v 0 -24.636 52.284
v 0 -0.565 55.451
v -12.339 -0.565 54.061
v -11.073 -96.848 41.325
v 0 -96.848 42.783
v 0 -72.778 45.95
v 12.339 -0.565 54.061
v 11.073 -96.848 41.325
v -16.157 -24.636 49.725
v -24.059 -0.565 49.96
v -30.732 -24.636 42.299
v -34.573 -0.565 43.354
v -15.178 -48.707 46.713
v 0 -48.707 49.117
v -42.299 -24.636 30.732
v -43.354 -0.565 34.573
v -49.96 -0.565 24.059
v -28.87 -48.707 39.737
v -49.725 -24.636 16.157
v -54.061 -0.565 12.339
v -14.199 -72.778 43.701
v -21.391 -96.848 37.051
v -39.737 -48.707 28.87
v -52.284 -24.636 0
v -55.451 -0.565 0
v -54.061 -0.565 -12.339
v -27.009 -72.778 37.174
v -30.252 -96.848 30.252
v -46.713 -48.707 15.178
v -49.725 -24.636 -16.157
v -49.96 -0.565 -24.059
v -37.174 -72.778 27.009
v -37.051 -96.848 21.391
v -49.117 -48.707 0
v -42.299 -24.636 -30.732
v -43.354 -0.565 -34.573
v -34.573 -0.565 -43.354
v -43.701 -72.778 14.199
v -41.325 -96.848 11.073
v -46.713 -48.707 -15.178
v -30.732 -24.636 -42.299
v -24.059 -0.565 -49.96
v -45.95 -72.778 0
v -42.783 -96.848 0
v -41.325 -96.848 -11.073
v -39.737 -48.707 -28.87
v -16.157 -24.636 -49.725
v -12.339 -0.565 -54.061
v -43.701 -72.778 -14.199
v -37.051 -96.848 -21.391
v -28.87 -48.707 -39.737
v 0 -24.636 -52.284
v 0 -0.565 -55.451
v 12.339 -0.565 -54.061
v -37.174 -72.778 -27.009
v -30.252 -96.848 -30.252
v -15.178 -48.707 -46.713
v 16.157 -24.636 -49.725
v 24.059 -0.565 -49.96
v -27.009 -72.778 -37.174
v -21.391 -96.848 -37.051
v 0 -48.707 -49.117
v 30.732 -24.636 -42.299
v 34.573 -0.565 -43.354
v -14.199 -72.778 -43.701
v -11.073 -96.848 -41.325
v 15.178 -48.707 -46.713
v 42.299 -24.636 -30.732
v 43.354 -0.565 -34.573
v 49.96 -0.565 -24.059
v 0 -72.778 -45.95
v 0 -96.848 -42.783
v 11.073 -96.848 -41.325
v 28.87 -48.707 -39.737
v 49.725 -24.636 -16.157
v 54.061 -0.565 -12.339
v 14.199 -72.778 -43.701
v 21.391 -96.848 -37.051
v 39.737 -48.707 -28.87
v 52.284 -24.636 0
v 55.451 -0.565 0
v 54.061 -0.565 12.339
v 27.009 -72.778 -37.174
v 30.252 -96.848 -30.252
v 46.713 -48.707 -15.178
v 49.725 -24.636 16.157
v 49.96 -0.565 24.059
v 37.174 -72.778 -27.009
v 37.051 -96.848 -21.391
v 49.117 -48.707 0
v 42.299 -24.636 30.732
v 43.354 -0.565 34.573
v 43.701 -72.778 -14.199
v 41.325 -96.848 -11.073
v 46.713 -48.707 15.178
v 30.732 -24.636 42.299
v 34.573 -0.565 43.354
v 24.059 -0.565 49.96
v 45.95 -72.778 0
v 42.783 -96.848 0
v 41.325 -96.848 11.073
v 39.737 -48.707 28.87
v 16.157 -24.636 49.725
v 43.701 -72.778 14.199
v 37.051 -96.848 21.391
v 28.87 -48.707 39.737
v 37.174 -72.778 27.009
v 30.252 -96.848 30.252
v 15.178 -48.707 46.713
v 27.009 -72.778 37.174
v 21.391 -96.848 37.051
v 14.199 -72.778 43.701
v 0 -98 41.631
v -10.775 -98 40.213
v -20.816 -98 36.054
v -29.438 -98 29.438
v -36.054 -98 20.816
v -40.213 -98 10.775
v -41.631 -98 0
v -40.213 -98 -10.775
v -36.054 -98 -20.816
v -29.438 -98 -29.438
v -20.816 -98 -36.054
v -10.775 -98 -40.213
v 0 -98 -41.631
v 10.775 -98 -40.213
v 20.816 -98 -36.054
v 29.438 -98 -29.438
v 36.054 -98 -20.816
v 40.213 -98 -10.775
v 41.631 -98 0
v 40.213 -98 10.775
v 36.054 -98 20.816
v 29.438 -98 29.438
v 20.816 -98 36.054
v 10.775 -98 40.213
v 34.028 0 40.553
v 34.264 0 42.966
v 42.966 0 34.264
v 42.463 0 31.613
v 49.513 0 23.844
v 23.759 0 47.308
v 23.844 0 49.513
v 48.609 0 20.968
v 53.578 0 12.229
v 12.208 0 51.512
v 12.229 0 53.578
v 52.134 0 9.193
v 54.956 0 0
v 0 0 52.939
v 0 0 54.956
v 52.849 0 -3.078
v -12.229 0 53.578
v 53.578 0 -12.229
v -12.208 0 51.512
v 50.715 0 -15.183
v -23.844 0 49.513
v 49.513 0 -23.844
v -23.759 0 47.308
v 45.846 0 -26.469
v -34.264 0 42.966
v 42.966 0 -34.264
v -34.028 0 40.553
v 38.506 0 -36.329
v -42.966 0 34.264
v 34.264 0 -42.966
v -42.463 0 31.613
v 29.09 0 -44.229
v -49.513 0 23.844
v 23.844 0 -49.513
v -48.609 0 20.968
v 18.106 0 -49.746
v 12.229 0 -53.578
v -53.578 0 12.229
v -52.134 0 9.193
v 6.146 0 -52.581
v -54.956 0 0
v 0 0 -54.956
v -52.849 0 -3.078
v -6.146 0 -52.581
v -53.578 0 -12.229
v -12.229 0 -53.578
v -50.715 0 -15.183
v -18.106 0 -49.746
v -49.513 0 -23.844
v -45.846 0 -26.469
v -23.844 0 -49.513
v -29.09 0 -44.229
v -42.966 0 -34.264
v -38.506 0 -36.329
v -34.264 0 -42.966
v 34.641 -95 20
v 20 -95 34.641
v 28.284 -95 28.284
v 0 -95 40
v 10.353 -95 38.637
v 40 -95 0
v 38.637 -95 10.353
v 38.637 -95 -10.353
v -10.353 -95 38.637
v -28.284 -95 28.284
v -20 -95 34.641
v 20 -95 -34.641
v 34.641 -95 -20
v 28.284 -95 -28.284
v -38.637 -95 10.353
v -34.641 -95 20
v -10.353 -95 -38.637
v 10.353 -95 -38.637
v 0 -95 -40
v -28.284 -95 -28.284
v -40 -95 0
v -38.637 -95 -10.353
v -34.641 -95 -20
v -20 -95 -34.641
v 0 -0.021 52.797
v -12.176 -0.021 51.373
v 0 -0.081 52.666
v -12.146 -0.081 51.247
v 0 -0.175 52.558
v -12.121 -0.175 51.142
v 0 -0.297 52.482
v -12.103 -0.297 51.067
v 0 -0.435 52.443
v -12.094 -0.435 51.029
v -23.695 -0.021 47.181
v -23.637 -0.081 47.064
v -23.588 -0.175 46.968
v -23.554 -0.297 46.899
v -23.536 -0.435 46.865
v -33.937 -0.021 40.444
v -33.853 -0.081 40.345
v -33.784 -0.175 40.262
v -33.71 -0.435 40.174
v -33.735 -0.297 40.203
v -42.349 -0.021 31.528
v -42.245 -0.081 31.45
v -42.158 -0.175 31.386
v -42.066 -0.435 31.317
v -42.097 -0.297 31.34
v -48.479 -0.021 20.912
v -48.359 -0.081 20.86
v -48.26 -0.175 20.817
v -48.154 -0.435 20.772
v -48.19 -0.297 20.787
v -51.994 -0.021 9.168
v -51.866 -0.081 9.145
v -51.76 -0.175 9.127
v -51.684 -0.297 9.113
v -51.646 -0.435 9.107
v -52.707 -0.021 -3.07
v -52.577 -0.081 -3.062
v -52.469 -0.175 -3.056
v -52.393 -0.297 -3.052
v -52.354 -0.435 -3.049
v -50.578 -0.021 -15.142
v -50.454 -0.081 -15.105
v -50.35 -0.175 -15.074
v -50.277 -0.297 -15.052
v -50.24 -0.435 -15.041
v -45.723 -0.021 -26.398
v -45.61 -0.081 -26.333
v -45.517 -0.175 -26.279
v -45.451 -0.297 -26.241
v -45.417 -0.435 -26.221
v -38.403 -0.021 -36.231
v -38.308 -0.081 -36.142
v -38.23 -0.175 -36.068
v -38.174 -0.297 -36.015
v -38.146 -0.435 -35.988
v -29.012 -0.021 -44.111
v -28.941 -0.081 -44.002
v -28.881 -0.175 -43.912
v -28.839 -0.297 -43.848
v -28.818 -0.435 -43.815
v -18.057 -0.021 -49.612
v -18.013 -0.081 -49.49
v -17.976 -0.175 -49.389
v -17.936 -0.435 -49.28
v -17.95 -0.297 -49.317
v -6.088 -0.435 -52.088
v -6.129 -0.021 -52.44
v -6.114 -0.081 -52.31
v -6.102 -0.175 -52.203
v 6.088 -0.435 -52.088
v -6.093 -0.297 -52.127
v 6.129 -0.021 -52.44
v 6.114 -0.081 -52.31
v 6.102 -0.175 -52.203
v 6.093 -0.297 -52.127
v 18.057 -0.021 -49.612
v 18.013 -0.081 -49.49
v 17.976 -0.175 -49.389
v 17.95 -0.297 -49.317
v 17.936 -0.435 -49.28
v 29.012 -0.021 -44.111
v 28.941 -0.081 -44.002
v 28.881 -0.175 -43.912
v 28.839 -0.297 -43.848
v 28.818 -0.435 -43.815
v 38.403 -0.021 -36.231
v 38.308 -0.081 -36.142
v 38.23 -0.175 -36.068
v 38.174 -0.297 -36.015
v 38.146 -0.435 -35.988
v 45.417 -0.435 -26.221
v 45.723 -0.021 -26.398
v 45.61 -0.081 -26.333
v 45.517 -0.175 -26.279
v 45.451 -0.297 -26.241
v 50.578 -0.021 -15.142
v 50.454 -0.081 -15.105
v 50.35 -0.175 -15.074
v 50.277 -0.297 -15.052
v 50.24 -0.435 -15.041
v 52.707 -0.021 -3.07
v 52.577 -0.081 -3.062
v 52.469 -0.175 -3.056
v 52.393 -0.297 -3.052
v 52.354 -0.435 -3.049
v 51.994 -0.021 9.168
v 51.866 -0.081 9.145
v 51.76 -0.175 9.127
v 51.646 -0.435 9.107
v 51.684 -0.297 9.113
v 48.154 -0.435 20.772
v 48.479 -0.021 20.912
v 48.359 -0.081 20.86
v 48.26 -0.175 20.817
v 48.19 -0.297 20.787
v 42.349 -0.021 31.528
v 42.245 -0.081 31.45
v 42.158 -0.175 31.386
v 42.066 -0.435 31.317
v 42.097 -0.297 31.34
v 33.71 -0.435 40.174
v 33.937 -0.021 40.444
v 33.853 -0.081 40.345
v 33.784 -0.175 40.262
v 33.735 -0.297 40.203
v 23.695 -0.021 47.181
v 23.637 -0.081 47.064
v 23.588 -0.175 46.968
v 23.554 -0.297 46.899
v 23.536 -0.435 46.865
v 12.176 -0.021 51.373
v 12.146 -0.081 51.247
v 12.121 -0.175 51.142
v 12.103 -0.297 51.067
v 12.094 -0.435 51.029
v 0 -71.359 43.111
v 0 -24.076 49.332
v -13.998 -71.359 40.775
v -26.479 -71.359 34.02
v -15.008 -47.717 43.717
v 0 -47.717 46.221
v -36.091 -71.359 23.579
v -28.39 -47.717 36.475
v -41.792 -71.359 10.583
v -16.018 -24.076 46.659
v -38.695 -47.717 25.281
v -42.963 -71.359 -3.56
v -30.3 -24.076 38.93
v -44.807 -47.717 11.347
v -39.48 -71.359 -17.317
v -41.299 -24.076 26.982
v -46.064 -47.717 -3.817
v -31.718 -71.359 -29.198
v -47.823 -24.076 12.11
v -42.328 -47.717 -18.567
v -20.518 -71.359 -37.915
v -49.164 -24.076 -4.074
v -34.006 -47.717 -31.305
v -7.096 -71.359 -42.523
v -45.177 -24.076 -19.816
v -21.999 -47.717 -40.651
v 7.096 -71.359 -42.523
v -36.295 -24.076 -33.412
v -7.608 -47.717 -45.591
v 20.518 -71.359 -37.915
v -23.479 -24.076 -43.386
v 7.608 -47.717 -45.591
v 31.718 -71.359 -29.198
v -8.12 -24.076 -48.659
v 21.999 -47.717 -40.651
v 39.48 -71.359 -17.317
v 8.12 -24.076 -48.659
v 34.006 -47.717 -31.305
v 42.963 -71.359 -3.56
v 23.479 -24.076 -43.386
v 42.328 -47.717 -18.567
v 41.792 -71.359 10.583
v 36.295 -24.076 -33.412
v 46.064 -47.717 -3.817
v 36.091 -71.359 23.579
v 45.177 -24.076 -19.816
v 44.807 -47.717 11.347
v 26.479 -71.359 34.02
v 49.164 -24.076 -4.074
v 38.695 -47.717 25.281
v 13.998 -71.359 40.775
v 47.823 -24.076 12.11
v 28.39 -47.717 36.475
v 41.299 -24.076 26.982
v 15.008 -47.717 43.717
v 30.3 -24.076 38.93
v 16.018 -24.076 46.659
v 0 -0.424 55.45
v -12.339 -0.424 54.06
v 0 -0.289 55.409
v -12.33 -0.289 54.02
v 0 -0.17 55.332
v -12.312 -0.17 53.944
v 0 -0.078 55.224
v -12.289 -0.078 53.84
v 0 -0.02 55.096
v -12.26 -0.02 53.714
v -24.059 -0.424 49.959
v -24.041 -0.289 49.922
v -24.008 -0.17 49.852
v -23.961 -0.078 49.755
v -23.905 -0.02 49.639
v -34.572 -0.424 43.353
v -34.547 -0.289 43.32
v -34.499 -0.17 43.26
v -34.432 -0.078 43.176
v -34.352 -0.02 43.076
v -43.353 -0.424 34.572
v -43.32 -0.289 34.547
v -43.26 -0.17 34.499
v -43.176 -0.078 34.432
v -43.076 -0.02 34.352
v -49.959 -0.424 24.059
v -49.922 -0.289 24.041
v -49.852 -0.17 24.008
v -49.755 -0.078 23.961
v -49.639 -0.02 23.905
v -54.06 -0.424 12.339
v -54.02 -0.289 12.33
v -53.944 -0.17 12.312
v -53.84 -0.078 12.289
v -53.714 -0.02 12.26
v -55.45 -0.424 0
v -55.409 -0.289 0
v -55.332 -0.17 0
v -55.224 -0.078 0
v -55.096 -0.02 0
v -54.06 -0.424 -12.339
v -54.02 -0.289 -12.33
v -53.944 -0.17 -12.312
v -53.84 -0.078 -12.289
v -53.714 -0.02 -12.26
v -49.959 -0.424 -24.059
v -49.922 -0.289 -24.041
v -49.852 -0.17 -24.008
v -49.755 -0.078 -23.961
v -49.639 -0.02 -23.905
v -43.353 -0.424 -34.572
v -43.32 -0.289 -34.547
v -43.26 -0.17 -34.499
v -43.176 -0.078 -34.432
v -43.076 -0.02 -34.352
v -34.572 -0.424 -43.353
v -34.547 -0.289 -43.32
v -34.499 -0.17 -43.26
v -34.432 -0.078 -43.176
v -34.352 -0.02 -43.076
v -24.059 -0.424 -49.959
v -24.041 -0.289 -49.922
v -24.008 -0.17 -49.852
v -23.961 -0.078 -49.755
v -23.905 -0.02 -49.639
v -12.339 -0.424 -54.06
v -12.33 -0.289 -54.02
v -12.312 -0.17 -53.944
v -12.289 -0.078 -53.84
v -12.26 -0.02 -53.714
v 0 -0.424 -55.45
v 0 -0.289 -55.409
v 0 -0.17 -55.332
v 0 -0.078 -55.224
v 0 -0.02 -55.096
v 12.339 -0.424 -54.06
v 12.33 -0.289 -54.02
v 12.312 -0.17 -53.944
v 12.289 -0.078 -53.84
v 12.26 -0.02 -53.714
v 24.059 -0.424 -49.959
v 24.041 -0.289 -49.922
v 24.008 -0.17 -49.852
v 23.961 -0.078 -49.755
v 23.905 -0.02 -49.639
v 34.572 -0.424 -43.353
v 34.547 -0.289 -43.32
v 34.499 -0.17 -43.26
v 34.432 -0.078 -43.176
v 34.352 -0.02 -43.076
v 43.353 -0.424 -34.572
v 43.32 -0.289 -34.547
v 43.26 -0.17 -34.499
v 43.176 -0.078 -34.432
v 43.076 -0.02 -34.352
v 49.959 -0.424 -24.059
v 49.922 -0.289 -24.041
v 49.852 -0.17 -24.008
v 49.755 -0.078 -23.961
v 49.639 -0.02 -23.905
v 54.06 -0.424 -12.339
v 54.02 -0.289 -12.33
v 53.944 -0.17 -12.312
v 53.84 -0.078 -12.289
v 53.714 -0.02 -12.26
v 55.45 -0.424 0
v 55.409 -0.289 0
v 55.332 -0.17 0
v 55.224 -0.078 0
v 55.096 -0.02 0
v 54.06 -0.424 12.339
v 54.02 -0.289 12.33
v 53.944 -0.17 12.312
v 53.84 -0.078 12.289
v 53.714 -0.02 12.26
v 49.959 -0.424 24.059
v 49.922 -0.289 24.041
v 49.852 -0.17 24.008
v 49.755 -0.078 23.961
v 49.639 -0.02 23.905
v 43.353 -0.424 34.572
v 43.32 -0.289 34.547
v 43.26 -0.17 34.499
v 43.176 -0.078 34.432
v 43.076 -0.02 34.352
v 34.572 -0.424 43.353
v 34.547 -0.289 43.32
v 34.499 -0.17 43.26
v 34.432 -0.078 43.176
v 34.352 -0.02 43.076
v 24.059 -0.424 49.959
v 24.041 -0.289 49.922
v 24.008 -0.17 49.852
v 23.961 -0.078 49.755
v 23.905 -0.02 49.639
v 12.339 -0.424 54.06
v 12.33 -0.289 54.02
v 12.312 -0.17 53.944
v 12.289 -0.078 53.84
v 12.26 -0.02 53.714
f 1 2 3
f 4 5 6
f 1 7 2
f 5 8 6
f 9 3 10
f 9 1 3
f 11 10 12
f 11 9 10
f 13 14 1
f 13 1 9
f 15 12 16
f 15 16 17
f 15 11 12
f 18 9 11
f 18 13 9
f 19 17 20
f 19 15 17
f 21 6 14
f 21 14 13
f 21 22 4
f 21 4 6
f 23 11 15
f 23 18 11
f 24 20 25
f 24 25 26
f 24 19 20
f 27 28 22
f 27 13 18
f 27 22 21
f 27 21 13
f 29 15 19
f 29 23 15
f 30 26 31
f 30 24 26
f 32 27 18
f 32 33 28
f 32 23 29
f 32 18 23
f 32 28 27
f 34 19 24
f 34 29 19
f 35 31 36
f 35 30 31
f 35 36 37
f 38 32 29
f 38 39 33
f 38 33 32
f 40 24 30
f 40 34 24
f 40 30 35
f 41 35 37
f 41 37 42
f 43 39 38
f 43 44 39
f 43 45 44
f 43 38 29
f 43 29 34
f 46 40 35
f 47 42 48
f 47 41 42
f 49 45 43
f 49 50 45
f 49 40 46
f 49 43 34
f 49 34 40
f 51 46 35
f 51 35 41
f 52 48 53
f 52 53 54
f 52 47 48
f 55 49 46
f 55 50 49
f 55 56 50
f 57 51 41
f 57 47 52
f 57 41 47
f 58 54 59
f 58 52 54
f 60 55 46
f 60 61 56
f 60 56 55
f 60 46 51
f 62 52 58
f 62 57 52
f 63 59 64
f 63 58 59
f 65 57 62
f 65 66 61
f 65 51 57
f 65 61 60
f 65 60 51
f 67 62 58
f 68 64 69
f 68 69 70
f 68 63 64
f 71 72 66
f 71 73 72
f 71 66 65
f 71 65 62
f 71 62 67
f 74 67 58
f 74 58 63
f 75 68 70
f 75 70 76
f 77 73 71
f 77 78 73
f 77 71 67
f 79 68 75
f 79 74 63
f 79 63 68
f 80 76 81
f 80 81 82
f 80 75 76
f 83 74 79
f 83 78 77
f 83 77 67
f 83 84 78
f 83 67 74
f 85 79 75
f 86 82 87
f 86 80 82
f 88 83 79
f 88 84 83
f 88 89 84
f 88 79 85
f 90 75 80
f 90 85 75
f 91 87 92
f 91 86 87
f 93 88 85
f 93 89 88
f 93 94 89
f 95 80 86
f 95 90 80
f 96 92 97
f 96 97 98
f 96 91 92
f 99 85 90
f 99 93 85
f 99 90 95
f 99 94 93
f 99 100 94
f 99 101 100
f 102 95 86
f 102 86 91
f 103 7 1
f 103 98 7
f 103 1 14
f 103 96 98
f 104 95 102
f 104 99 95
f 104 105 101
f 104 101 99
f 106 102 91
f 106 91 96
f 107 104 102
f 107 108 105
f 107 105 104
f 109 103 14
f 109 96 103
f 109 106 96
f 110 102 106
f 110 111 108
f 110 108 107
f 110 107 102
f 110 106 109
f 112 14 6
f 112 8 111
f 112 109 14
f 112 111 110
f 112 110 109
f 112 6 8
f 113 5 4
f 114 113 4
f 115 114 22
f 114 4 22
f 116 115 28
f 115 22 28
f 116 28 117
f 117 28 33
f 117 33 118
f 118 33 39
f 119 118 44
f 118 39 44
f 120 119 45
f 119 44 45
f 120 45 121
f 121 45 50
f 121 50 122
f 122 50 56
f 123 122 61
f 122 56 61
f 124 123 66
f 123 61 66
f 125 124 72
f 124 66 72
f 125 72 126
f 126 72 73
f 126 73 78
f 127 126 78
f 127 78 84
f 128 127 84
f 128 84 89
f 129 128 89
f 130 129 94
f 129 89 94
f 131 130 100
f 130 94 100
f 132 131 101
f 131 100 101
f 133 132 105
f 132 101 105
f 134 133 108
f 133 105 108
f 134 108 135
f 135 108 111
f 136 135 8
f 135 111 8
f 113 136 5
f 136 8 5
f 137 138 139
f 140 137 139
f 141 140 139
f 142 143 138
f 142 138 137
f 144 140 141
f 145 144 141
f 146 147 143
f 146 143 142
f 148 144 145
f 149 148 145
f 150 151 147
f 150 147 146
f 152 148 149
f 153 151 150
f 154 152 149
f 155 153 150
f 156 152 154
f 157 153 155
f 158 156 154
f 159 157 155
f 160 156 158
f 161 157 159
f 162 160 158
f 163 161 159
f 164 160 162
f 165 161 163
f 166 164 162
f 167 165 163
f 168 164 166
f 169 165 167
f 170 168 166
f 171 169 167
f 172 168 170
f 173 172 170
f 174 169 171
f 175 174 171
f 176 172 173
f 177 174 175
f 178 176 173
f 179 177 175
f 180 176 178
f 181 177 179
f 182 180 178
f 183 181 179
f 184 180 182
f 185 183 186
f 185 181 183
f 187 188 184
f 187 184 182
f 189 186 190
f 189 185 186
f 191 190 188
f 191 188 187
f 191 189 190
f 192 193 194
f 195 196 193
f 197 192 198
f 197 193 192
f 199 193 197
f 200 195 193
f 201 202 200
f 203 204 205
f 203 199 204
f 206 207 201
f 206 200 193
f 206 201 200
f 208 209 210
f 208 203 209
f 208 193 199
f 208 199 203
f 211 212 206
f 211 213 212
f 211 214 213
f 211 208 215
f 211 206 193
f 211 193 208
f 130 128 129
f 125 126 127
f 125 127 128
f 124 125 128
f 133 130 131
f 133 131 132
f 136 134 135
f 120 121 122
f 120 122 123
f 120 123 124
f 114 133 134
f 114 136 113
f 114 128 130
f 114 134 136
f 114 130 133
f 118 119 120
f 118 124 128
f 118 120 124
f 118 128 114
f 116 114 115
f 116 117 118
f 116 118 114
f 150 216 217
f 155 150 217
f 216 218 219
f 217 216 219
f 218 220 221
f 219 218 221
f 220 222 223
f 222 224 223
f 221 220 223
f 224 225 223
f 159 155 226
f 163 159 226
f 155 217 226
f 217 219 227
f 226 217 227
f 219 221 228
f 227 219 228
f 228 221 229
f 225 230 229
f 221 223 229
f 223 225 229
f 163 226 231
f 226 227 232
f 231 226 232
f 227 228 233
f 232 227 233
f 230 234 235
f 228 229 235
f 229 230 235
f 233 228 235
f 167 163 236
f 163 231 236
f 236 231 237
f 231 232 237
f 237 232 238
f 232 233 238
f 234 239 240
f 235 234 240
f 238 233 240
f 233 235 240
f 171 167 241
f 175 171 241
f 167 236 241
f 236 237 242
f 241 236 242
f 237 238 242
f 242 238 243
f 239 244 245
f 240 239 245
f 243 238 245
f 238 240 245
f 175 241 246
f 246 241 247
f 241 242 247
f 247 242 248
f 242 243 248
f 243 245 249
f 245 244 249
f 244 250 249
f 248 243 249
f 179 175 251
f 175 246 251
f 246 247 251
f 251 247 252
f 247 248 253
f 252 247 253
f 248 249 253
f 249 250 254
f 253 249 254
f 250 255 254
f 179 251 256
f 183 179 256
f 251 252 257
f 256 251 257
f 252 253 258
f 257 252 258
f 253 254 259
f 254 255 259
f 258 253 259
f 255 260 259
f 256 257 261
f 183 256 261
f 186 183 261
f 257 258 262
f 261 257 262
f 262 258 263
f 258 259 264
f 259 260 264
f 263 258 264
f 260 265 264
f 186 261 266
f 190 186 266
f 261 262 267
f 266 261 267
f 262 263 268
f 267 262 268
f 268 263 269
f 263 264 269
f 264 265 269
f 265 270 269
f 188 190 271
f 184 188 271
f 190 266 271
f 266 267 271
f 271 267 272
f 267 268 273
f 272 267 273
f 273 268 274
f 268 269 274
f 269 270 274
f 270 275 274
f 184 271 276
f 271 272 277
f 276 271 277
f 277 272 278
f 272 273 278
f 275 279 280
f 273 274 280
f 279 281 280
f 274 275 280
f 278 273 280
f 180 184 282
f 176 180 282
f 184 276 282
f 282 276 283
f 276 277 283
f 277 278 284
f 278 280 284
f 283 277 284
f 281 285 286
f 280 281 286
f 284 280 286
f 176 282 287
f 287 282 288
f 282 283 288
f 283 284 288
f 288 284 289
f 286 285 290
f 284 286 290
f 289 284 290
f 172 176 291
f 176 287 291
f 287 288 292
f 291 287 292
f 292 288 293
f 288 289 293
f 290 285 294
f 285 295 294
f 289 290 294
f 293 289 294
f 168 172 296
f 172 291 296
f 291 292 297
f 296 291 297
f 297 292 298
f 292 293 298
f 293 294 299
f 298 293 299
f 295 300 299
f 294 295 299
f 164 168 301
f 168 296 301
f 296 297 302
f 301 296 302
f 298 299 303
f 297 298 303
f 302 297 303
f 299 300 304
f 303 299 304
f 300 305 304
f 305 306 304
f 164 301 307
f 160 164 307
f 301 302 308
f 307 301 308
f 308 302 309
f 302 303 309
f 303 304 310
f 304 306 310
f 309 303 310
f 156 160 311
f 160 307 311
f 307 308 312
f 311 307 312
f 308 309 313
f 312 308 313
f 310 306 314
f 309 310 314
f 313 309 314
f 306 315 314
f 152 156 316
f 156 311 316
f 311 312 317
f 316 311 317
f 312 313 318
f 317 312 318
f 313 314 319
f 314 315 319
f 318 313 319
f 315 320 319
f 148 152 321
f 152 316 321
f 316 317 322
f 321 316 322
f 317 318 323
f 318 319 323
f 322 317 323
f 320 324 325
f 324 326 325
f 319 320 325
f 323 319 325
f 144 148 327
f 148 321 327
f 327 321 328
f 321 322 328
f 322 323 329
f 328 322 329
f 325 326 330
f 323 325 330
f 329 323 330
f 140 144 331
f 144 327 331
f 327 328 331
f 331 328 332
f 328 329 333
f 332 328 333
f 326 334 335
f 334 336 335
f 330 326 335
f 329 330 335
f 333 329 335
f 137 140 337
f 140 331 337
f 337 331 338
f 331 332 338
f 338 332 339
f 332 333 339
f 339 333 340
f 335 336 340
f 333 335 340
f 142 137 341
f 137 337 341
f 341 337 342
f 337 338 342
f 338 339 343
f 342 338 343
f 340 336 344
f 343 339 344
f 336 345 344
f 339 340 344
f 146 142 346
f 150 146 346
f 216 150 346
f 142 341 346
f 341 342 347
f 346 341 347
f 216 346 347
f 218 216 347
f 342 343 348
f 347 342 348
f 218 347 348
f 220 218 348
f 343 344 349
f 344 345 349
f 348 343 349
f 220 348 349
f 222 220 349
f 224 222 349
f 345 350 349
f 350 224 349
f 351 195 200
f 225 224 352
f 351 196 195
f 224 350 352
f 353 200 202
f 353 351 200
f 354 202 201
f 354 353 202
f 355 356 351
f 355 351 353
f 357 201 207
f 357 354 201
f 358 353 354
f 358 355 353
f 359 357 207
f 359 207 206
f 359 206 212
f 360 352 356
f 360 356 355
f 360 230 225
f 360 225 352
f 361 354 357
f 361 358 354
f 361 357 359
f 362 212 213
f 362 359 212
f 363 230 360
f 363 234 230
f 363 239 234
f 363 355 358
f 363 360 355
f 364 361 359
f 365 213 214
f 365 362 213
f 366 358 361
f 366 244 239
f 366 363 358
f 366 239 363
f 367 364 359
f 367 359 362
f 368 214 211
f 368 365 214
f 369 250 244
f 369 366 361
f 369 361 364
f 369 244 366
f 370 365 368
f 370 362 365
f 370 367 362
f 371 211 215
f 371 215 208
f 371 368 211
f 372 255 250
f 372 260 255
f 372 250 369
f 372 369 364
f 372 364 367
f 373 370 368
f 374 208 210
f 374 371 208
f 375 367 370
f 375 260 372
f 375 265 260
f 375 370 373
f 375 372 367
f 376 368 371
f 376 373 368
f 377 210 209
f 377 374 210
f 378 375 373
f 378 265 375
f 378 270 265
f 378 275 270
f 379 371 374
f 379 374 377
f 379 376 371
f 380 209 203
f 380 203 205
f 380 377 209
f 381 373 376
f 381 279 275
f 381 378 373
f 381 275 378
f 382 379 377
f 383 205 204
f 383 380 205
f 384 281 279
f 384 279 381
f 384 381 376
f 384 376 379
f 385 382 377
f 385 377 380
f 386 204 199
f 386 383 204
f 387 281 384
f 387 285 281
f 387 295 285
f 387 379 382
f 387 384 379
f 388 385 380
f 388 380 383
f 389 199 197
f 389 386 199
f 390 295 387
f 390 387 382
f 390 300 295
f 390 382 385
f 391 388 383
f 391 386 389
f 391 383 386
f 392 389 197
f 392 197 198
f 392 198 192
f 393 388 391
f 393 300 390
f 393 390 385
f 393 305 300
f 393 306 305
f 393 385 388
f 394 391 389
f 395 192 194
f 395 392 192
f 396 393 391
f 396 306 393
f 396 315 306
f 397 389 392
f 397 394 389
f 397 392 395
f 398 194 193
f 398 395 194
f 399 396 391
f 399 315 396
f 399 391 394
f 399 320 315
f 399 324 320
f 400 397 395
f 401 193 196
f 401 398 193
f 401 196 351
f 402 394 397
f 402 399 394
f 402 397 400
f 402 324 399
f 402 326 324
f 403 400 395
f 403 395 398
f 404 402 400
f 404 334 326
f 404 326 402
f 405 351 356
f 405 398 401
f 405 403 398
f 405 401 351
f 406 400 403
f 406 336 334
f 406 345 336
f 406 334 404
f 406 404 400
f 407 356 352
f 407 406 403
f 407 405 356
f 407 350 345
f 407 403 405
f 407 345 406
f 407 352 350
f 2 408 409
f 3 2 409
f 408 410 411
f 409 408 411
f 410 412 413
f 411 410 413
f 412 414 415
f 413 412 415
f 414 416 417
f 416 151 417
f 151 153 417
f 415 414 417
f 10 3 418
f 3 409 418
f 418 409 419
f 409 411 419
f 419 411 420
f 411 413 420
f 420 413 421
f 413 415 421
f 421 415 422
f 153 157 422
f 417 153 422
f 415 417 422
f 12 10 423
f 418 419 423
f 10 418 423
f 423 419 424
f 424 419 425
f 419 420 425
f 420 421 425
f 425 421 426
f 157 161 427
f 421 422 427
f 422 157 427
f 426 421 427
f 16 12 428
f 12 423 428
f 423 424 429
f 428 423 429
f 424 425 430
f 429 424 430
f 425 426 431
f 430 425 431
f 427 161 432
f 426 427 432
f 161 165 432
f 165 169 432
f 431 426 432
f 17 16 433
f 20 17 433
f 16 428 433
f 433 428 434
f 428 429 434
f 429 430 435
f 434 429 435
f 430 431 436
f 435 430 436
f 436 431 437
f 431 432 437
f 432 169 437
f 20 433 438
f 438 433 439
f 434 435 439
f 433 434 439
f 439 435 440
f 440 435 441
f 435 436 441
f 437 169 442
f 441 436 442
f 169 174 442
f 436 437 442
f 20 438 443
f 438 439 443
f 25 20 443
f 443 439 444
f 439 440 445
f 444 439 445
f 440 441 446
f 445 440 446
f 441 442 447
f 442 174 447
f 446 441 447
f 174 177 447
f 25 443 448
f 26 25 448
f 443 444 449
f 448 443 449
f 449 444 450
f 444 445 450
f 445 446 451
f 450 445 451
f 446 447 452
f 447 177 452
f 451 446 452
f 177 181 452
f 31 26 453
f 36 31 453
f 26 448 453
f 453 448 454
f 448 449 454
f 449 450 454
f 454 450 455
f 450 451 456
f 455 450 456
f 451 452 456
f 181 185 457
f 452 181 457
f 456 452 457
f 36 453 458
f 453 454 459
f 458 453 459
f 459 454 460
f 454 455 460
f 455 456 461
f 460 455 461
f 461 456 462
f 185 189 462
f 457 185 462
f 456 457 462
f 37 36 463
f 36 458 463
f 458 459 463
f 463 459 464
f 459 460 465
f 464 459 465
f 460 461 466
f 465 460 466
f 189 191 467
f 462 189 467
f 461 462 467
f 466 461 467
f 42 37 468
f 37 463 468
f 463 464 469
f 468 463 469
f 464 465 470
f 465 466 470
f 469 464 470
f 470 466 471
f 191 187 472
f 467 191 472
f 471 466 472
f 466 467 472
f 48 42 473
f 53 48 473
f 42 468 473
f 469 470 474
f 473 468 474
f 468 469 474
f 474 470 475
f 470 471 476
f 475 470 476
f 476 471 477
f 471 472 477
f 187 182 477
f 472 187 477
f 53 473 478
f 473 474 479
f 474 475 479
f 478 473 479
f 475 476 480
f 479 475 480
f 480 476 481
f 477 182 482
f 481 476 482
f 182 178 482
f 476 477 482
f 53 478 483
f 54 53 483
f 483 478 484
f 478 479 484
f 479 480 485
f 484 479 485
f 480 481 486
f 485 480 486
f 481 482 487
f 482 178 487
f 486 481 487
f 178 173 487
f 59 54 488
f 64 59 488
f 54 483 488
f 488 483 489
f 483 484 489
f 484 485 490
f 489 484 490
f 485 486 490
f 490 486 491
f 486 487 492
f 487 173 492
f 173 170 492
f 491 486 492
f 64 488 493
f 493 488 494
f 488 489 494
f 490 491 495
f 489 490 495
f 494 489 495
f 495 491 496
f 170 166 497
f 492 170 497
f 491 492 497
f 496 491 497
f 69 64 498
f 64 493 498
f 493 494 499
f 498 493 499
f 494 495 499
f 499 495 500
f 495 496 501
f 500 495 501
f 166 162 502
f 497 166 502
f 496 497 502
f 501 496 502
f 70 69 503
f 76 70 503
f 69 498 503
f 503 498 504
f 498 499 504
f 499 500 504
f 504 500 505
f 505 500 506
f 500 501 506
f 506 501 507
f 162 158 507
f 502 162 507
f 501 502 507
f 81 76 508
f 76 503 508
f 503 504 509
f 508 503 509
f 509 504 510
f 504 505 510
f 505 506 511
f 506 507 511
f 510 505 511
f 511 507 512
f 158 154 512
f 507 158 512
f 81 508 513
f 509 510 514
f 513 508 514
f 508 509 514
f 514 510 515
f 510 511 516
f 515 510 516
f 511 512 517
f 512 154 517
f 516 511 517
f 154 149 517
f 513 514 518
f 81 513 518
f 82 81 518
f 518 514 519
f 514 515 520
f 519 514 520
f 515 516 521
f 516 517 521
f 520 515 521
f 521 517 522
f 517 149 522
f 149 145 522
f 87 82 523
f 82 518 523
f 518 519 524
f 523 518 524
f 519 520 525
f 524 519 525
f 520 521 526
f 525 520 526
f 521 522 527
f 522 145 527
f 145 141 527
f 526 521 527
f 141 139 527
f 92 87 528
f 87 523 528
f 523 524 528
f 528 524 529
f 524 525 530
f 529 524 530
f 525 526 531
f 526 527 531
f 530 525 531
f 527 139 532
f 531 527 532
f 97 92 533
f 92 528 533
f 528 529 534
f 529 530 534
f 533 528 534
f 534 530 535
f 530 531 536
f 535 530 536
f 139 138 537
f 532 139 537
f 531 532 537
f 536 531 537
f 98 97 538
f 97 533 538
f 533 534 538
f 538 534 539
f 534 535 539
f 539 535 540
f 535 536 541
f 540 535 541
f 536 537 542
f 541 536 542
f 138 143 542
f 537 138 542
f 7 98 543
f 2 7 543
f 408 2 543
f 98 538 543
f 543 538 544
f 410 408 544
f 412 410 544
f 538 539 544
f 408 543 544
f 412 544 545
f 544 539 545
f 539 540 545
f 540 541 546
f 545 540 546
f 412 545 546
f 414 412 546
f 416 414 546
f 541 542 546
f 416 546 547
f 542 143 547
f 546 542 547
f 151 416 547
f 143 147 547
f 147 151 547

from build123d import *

# Parameters (mm, degrees)
CHAMFER1_SIZE  = 1
CHAMFER1_SIZE2 = 1.161440479
FILLET1_R      = 0.5


with BuildPart() as part:
    # Sketch1 → Revolve1 (revolve)
    with BuildSketch(Plane(origin=(0, 0, 0), x_dir=(0, 0, -1), z_dir=(1, 0, 0)), mode=Mode.PRIVATE) as revolve1_sk:
        Polygon((0, -95), (40, -95), (52.5, 0), (55.525858089, 0), (42.631121247, -98), (0, -98), align=None)
    revolve(revolve1_sk.sketch.rotate(Axis((0, 0, 0), (0, -1, 0)), 180), axis=Axis((0, 0, 0), (0, -1, 0)))

    # Chamfer1
    chamfer1_edges = [part.edges().sort_by_distance(p)[0] for p in [
        (0, -98, -42.631121247),
    ]]
    chamfer1_side = [part.faces().sort_by_distance(p)[0] for p in [
        (0, -98, 0),
    ]]
    chamfer(chamfer1_edges, length=CHAMFER1_SIZE, length2=CHAMFER1_SIZE2, reference=chamfer1_side[0])

    # Fillet1
    fillet1_edges = [part.edges().sort_by_distance(p)[0] for p in [
        (0, 0, -52.5),
        (0, 0, -55.525858089),
    ]]
    fillet(fillet1_edges, radius=FILLET1_R)


solid = part.part
